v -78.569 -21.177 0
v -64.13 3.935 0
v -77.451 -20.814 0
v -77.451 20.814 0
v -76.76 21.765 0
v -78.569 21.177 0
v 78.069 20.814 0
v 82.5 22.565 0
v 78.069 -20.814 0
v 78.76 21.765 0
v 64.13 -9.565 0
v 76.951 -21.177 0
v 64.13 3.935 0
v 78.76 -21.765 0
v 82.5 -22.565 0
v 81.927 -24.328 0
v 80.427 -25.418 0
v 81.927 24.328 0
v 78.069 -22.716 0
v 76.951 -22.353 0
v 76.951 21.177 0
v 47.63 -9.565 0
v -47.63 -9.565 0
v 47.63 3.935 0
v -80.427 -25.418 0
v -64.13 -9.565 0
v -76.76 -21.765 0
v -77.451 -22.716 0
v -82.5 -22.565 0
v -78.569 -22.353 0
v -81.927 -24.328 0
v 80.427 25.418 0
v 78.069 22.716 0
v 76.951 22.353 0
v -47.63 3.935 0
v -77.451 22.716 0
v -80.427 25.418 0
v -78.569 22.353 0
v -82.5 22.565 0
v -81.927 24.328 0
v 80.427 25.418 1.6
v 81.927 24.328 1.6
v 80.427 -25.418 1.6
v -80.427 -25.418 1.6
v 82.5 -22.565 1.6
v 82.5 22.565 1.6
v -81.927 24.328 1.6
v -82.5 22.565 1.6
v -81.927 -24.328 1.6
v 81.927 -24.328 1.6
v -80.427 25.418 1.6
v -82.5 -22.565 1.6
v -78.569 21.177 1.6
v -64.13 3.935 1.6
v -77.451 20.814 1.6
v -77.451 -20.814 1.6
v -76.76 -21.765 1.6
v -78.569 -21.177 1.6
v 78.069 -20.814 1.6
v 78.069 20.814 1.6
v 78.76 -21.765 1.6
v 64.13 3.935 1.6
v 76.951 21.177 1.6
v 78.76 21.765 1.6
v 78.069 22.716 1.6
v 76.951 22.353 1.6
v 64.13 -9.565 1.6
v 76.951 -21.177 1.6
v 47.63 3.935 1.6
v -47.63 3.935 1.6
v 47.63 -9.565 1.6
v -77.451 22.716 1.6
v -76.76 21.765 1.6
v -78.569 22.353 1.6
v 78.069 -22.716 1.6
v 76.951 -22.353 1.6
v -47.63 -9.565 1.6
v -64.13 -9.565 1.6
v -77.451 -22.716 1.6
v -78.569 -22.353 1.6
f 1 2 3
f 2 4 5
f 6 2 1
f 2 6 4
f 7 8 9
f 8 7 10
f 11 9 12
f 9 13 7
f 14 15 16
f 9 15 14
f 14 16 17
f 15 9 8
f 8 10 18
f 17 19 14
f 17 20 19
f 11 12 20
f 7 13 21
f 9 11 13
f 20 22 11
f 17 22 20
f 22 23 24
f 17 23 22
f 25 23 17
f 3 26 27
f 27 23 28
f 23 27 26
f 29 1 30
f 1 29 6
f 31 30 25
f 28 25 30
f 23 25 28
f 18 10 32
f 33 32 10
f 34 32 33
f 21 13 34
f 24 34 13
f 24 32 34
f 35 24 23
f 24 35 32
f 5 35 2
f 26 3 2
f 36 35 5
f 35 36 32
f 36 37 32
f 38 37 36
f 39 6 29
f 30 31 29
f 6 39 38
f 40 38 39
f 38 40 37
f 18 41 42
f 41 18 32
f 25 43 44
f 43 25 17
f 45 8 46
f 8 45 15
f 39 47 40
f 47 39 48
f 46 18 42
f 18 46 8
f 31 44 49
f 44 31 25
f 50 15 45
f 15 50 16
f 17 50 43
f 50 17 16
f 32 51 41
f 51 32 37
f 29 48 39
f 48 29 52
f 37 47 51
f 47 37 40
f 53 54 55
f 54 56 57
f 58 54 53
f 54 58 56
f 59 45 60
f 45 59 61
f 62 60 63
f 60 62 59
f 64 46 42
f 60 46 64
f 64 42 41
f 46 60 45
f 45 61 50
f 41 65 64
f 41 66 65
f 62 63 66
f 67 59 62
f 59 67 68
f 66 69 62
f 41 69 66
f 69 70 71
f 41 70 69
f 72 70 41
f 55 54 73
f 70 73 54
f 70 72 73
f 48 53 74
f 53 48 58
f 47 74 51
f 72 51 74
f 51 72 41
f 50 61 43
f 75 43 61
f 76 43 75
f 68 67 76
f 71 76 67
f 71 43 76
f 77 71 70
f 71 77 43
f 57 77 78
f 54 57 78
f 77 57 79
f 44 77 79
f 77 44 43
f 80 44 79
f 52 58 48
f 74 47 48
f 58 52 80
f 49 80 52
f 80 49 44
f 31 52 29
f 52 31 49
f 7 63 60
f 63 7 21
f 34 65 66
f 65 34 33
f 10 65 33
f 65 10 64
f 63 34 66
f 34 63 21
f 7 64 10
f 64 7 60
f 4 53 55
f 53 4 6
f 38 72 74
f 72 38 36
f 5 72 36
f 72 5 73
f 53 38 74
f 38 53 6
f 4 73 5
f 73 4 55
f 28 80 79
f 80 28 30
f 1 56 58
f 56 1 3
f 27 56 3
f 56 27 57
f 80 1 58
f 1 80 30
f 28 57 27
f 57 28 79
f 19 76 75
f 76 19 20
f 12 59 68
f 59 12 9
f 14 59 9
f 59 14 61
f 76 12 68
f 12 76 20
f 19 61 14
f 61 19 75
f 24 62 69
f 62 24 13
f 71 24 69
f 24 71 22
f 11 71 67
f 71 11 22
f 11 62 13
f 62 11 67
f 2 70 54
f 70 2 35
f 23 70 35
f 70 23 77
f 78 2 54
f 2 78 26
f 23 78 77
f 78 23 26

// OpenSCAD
// file: src/otvory_conf.scad
//Konfigurace pro otvory

//1B) - LCD 2x16
//vzdalenost der
vzdalenost_der_x = 75;
vzdalenost_der_y = 31;
prumer_otvoru = 2.7;
prumer_sloupku = 5;

//ramecek LCD
ramecek_x = 72;
ramecek_y = 23;

//vyska ramecku LCD
ramecek_vyska = 5;
// file: configuration.scad
//UNIBOX03A
//------------------------------------------------------------
///*

rozmer_x=165;
rozmer_y=51.13;
sila=1.5;

roztec_srouby_x=155.52;
roztec_srouby_y=43.53;
prumer_sroubu=2;
zakulaceni_hrany=3;

roztec_der=10.16;
pocet_der_osa_x=15;
// file: src/otvory.scad
//Funkce otvuru pro ruzne prvky umistene do celicek

/*OBSAHUJE
    1A)
    1B)
    1C) - Pro modul USBI2C01A
    1D) - Pro konektor MIC338
    1E) - Pro modul UNIPOWER02A
    1F) - Pro modul I2CDIFF01A
    1G) - Pro modul UNIPOWER03A
    1H) - Větrací otvor
    
    2A) - Otvor na IR
*/


/*1C) - Pro modul USBI2C01A
--------------------------------------------------------
--------------------------------------------------------
pocet_der_dane_strany - protoze nelze definovat na jake strane bude dira umistena, proto se musí rucne zadat pocet der zvolene strany krabicky
posun_od_okraje - zadava se o kolik der se ma posunot modul od kraje celicka
vzdalenost_der - definuje roztec der

modul na dvou matkách má vysku 6.5 mm, pokud nebudo zasahne do nastaveni list krabicky, bude nutno zvednout vysku modulu.

*/

module USBI2C01A(tloustka_bocnice,vzdalenost_der) //uz upraveno
{
 USBI2C01A_sirka_kon=12; //sirka konektoru
 USBI2C01A_vyska_kon=11; //vyska konektoru
 USBI2C01A_sirka_mod_otvory=3; //kolik modul zabira der
 USBI2C01A_svyska_nad_plbase=6; //kolik modul zabira der   
   translate([vzdalenost_der*(USBI2C01A_sirka_mod_otvory-1)/2,0,USBI2C01A_vyska_kon/2+USBI2C01A_svyska_nad_plbase])
   cube(size = [USBI2C01A_sirka_kon,tloustka_bocnice+0.2,USBI2C01A_vyska_kon], center = true);  
    
}

/*1D) - Pro konektor MIC338
--------------------------------------------------------
--------------------------------------------------------
*/
//posun_od_okraje - zadava se o kolik der se ma posunot otvor od středu celicka v nasobcich roztece der

module MIC338(tloustka_bocnice,vzdalenost_der,vyska_bocnice)
{
 MIC338_polomer_kon=8; //polomer montazniho otvoru
   translate([0,0,vyska_bocnice/2])
        rotate(a=[90,0,0])
            cylinder(h=tloustka_bocnice+0.1, r=MIC338_polomer_kon+0.1, center=true);  
    
}

/*1E) - Pro modul UNIPOWER02A
--------------------------------------------------------
--------------------------------------------------------
pocet_der_dane_strany - protoze nelze definovat na jake strane bude dira umistena, proto se musí rucne zadat pocet der zvolene strany krabicky
posun_od_okraje - zadava se o kolik der se ma posunot modul od kraje celicka
vzdalenost_der - definuje rozec der

modul na dvou matkách má vysku 6.5 mm, pokud nebudo zasahne do nastaveni list krabicky, bude nutno zvednout vysku modulu.

*/



module UNIPOWER02A(tloustka_bocnice,vzdalenost_der)
{
 UNIPOWER02A_sirka_kon=10; //sirka konektoru
 UNIPOWER02A_vyska_kon=11; //vyska konektoru
 UNIPOWER02A_sirka_mod_otvory=4; //kolik modul zabira der
 UNIPOWER02A_vzdalenost_konektoru=6; //vzdalenost kraje konektoru od středu šroubu
    UNIPOWER02A_vyska_nad_plbase=6; //vyska mezi albase a konektorem
   translate([UNIPOWER02A_vzdalenost_konektoru,-tloustka_bocnice/2-0.05,UNIPOWER02A_vyska_nad_plbase])
   cube(size = [UNIPOWER02A_sirka_kon,tloustka_bocnice+0.1,UNIPOWER02A_vyska_kon], center = false);
 }   
 
/*1F) - Pro modul I2CDIFF01A
--------------------------------------------------------
--------------------------------------------------------
pocet_der_dane_strany - protoze nelze definovat na jake strane bude dira umistena, proto se musí rucne zadat pocet der zvolene strany krabicky
posun_od_okraje - zadava se o kolik der se ma posunot modul od kraje celicka
vzdalenost_der - definuje roztec der

modul na dvou matkách má vysku 6.5 mm, pokud nebudo zasahne do nastaveni list krabicky, bude nutno zvednout vysku modulu.

*/


module I2CDIFF01A(tloustka_bocnice,vzdalenost_der) //uz upraveno
{
 I2CDIFF01A_sirka_kon=16.5; //sirka konektoru
 I2CDIFF01A_vyska_kon=13.5; //vyska konektoru
 I2CDIFF01A_sirka_mod_otvory=4; //kolik modul zabira der
 I2CDIFF01A_vyska_nad_plbase=6; //vyska mezi albase a konektorem
   translate([vzdalenost_der*(I2CDIFF01A_sirka_mod_otvory-1)/2,0,I2CDIFF01A_vyska_kon/2+I2CDIFF01A_vyska_nad_plbase])
   cube(size = [I2CDIFF01A_sirka_kon,tloustka_bocnice+0.2,I2CDIFF01A_vyska_kon], center = true);  
    
}
 

/*1G) - Pro modul UNIPOWER03A
--------------------------------------------------------
--------------------------------------------------------

*/

module UNIPOWER03A(tloustka_bocnice,vzdalenost_der)
{
 UNIPOWER03A_sirka_kon=10; //sirka konektoru
 UNIPOWER03A_vyska_kon=11; //vyska konektoru
 UNIPOWER03A_sirka_mod_otvory=4; //kolik modul zabira der
 UNIPOWER03A_vzdalenost_konektoru=5; //vzdalenost kraje konektoru od středu šroubu
    UNIPOWER03A_vyska_nad_plbase=6; //vyska mezi albase a konektorem
    
    
   translate([(UNIPOWER03A_sirka_mod_otvory-1)*vzdalenost_der-UNIPOWER03A_sirka_kon-UNIPOWER03A_vzdalenost_konektoru,-tloustka_bocnice/2-0.05,UNIPOWER03A_vyska_nad_plbase])
   cube(size = [UNIPOWER03A_sirka_kon,tloustka_bocnice+0.1,UNIPOWER03A_vyska_kon], center = false);
 }  
 

 /*1G) - OTVOR PRO VETRANI
--------------------------------------------------------
--------------------------------------------------------

*/
 module CHLADICI_OTVORY(tloustka_bocnice,vzdalenost_der,delka,vyska_bocnice)
{
CHLADICI_OTVORY_mezera=0.6; 
CHLADICI_OTVORY_snizeni_vysky=10; 
CHLADICI_OTVORY_prekryti=1.2;     
    
   for (a =[1:delka]) 
     translate([vzdalenost_der*(a-1),0,0])  
   {   
  union() {
   translate([CHLADICI_OTVORY_prekryti/2,-CHLADICI_OTVORY_mezera/2+0.005,CHLADICI_OTVORY_snizeni_vysky/2])
   cube(size = [(vzdalenost_der-2*CHLADICI_OTVORY_prekryti)/2,(tloustka_bocnice+CHLADICI_OTVORY_mezera)/2,vyska_bocnice-CHLADICI_OTVORY_snizeni_vysky], center = false);
    
     translate([(vzdalenost_der+CHLADICI_OTVORY_prekryti)/2,-tloustka_bocnice/2-0.005,CHLADICI_OTVORY_snizeni_vysky/2])
   cube(size = [(vzdalenost_der-2*CHLADICI_OTVORY_prekryti)/2,(tloustka_bocnice+CHLADICI_OTVORY_mezera)/2,vyska_bocnice-CHLADICI_OTVORY_snizeni_vysky], center = false);
    
    
    translate([(vzdalenost_der-CHLADICI_OTVORY_prekryti)/2,-CHLADICI_OTVORY_mezera/2,CHLADICI_OTVORY_snizeni_vysky/2])
    cube(size = [CHLADICI_OTVORY_prekryti,CHLADICI_OTVORY_mezera,vyska_bocnice-CHLADICI_OTVORY_snizeni_vysky], center = false);
      
    translate([(vzdalenost_der-CHLADICI_OTVORY_prekryti)/2+vzdalenost_der/2,-CHLADICI_OTVORY_mezera/2,CHLADICI_OTVORY_snizeni_vysky/2])
    cube(size = [CHLADICI_OTVORY_prekryti+1,CHLADICI_OTVORY_mezera,vyska_bocnice-CHLADICI_OTVORY_snizeni_vysky], center = false);  
 }
 }
 }
 
 
 /*2A) - OTVOR PRO IR
--------------------------------------------------------
--------------------------------------------------------

*/
 
 module IR(tloustka_bocnice,vyska_bocnice)
{
    IR_sirka_kon=7; //sirka senzoru
    IR_vyska_kon=7.5; //vyska senzoru
    IR_hloubka_venkovni=1.2; //sila senzoru od vodičů ven
    IR_vyska_pro_vodice=5; 
    
    
   translate([0,-tloustka_bocnice/2-0.01,vyska_bocnice/2-IR_vyska_kon/2])
   cube(size = [IR_sirka_kon,IR_hloubka_venkovni+0.1,IR_vyska_kon], center = false);
    
    translate([0,-(tloustka_bocnice/2-IR_hloubka_venkovni),vyska_bocnice/2-IR_vyska_kon/2-IR_vyska_pro_vodice])
   cube(size = [IR_sirka_kon,tloustka_bocnice,IR_vyska_kon+IR_vyska_pro_vodice], center = false);
 } 
 
 
 module OTVOR_NA_PRUDUCH(tloustka_bocnice,vzdalenost_der,delka,vyska_bocnice)
{
OTVOR_NA_PRUDUCH_vzdalenost_od_kraje=5; 
    
    
  
     translate([0,-0.05-tloustka_bocnice/2,OTVOR_NA_PRUDUCH_vzdalenost_od_kraje])  
      
  
   cube(size = [vzdalenost_der*(delka),tloustka_bocnice+0.1,vyska_bocnice-2*OTVOR_NA_PRUDUCH_vzdalenost_od_kraje], center = false);
    
     
 
 
 }
 
 
 module CHLADICI_OTVORY2(tloustka_bocnice,vzdalenost_der,delka,vyska_bocnice)
{
CHLADICI_OTVORY2_mezera=1.0; 
CHLADICI_OTVORY2_snizeni_vysky=10; 
    
    
   for (a =[1:delka]) 
     translate([vzdalenost_der*(a-1),0,0])  
   {   

   translate([vzdalenost_der/2,-0.05-tloustka_bocnice/2,CHLADICI_OTVORY2_snizeni_vysky/2])
   cube(size = [CHLADICI_OTVORY2_mezera,tloustka_bocnice+0.1,vyska_bocnice-CHLADICI_OTVORY2_snizeni_vysky], center = false);
    
     
 
 }
 }
// file: src/UNIBOX03A_D01.scad
include <../configuration.scad>


//PLBASE ZAKLADNI
//------------------------------------------------------------

//UNIBOX03A_D01();

module UNIBOX03A_D01(){

difference () {

translate([-(rozmer_x/2-zakulaceni_hrany),-(rozmer_y/2-zakulaceni_hrany),0]) 
minkowski()
    {
	cube([rozmer_x-2*zakulaceni_hrany,rozmer_y-2*zakulaceni_hrany,sila]);         
        cylinder(r=zakulaceni_hrany,h=0.1);
    }
  
//odecet otvory

translate([roztec_srouby_x/2,roztec_srouby_y/2,0])      
    cylinder(sila*5, d=prumer_sroubu, center=true);   
  
translate([-roztec_srouby_x/2,roztec_srouby_y/2,0])      
    cylinder(sila*5, d=prumer_sroubu, center=true);    

translate([-roztec_srouby_x/2,-roztec_srouby_y/2,0])      
    cylinder(sila*5, d=prumer_sroubu, center=true);

translate([roztec_srouby_x/2,-roztec_srouby_y/2,0])      
    cylinder(sila*5, d=prumer_sroubu, center=true);

}
}
// main file
use <src/UNIBOX03A_D01.scad>
use <src/otvory.scad>

include <configuration.scad>
include <src/otvory_conf.scad>


barva_sloupku = "cyan";
barva_listy = "red";
barva_celicka = "green";
barva_plbase = "yellow";

//Předni čeličko
//------------------------------------------------------------

vzdalenost_AL=10; //vzdalenost od hrany čelíčka k vrchní hraně ALbase

difference() {
color(barva_sloupku)
translate([0,0,0])
UNIBOX03A_D01();



posun_modulu_der_x=11;
rotate(a=[-90,0,0])
translate([posun_modulu_der_x*roztec_der-roztec_der*(pocet_der_osa_x-1)/2,0,-rozmer_y/2+vzdalenost_AL])
I2CDIFF01A(2*sila,roztec_der);
    
posun_modulu_der_x1=0;
rotate(a=[-90,0,0])
translate([posun_modulu_der_x1*roztec_der-roztec_der*(pocet_der_osa_x-1)/2,0,-rozmer_y/2+vzdalenost_AL])
I2CDIFF01A(2*sila,roztec_der);    
    
     }  
